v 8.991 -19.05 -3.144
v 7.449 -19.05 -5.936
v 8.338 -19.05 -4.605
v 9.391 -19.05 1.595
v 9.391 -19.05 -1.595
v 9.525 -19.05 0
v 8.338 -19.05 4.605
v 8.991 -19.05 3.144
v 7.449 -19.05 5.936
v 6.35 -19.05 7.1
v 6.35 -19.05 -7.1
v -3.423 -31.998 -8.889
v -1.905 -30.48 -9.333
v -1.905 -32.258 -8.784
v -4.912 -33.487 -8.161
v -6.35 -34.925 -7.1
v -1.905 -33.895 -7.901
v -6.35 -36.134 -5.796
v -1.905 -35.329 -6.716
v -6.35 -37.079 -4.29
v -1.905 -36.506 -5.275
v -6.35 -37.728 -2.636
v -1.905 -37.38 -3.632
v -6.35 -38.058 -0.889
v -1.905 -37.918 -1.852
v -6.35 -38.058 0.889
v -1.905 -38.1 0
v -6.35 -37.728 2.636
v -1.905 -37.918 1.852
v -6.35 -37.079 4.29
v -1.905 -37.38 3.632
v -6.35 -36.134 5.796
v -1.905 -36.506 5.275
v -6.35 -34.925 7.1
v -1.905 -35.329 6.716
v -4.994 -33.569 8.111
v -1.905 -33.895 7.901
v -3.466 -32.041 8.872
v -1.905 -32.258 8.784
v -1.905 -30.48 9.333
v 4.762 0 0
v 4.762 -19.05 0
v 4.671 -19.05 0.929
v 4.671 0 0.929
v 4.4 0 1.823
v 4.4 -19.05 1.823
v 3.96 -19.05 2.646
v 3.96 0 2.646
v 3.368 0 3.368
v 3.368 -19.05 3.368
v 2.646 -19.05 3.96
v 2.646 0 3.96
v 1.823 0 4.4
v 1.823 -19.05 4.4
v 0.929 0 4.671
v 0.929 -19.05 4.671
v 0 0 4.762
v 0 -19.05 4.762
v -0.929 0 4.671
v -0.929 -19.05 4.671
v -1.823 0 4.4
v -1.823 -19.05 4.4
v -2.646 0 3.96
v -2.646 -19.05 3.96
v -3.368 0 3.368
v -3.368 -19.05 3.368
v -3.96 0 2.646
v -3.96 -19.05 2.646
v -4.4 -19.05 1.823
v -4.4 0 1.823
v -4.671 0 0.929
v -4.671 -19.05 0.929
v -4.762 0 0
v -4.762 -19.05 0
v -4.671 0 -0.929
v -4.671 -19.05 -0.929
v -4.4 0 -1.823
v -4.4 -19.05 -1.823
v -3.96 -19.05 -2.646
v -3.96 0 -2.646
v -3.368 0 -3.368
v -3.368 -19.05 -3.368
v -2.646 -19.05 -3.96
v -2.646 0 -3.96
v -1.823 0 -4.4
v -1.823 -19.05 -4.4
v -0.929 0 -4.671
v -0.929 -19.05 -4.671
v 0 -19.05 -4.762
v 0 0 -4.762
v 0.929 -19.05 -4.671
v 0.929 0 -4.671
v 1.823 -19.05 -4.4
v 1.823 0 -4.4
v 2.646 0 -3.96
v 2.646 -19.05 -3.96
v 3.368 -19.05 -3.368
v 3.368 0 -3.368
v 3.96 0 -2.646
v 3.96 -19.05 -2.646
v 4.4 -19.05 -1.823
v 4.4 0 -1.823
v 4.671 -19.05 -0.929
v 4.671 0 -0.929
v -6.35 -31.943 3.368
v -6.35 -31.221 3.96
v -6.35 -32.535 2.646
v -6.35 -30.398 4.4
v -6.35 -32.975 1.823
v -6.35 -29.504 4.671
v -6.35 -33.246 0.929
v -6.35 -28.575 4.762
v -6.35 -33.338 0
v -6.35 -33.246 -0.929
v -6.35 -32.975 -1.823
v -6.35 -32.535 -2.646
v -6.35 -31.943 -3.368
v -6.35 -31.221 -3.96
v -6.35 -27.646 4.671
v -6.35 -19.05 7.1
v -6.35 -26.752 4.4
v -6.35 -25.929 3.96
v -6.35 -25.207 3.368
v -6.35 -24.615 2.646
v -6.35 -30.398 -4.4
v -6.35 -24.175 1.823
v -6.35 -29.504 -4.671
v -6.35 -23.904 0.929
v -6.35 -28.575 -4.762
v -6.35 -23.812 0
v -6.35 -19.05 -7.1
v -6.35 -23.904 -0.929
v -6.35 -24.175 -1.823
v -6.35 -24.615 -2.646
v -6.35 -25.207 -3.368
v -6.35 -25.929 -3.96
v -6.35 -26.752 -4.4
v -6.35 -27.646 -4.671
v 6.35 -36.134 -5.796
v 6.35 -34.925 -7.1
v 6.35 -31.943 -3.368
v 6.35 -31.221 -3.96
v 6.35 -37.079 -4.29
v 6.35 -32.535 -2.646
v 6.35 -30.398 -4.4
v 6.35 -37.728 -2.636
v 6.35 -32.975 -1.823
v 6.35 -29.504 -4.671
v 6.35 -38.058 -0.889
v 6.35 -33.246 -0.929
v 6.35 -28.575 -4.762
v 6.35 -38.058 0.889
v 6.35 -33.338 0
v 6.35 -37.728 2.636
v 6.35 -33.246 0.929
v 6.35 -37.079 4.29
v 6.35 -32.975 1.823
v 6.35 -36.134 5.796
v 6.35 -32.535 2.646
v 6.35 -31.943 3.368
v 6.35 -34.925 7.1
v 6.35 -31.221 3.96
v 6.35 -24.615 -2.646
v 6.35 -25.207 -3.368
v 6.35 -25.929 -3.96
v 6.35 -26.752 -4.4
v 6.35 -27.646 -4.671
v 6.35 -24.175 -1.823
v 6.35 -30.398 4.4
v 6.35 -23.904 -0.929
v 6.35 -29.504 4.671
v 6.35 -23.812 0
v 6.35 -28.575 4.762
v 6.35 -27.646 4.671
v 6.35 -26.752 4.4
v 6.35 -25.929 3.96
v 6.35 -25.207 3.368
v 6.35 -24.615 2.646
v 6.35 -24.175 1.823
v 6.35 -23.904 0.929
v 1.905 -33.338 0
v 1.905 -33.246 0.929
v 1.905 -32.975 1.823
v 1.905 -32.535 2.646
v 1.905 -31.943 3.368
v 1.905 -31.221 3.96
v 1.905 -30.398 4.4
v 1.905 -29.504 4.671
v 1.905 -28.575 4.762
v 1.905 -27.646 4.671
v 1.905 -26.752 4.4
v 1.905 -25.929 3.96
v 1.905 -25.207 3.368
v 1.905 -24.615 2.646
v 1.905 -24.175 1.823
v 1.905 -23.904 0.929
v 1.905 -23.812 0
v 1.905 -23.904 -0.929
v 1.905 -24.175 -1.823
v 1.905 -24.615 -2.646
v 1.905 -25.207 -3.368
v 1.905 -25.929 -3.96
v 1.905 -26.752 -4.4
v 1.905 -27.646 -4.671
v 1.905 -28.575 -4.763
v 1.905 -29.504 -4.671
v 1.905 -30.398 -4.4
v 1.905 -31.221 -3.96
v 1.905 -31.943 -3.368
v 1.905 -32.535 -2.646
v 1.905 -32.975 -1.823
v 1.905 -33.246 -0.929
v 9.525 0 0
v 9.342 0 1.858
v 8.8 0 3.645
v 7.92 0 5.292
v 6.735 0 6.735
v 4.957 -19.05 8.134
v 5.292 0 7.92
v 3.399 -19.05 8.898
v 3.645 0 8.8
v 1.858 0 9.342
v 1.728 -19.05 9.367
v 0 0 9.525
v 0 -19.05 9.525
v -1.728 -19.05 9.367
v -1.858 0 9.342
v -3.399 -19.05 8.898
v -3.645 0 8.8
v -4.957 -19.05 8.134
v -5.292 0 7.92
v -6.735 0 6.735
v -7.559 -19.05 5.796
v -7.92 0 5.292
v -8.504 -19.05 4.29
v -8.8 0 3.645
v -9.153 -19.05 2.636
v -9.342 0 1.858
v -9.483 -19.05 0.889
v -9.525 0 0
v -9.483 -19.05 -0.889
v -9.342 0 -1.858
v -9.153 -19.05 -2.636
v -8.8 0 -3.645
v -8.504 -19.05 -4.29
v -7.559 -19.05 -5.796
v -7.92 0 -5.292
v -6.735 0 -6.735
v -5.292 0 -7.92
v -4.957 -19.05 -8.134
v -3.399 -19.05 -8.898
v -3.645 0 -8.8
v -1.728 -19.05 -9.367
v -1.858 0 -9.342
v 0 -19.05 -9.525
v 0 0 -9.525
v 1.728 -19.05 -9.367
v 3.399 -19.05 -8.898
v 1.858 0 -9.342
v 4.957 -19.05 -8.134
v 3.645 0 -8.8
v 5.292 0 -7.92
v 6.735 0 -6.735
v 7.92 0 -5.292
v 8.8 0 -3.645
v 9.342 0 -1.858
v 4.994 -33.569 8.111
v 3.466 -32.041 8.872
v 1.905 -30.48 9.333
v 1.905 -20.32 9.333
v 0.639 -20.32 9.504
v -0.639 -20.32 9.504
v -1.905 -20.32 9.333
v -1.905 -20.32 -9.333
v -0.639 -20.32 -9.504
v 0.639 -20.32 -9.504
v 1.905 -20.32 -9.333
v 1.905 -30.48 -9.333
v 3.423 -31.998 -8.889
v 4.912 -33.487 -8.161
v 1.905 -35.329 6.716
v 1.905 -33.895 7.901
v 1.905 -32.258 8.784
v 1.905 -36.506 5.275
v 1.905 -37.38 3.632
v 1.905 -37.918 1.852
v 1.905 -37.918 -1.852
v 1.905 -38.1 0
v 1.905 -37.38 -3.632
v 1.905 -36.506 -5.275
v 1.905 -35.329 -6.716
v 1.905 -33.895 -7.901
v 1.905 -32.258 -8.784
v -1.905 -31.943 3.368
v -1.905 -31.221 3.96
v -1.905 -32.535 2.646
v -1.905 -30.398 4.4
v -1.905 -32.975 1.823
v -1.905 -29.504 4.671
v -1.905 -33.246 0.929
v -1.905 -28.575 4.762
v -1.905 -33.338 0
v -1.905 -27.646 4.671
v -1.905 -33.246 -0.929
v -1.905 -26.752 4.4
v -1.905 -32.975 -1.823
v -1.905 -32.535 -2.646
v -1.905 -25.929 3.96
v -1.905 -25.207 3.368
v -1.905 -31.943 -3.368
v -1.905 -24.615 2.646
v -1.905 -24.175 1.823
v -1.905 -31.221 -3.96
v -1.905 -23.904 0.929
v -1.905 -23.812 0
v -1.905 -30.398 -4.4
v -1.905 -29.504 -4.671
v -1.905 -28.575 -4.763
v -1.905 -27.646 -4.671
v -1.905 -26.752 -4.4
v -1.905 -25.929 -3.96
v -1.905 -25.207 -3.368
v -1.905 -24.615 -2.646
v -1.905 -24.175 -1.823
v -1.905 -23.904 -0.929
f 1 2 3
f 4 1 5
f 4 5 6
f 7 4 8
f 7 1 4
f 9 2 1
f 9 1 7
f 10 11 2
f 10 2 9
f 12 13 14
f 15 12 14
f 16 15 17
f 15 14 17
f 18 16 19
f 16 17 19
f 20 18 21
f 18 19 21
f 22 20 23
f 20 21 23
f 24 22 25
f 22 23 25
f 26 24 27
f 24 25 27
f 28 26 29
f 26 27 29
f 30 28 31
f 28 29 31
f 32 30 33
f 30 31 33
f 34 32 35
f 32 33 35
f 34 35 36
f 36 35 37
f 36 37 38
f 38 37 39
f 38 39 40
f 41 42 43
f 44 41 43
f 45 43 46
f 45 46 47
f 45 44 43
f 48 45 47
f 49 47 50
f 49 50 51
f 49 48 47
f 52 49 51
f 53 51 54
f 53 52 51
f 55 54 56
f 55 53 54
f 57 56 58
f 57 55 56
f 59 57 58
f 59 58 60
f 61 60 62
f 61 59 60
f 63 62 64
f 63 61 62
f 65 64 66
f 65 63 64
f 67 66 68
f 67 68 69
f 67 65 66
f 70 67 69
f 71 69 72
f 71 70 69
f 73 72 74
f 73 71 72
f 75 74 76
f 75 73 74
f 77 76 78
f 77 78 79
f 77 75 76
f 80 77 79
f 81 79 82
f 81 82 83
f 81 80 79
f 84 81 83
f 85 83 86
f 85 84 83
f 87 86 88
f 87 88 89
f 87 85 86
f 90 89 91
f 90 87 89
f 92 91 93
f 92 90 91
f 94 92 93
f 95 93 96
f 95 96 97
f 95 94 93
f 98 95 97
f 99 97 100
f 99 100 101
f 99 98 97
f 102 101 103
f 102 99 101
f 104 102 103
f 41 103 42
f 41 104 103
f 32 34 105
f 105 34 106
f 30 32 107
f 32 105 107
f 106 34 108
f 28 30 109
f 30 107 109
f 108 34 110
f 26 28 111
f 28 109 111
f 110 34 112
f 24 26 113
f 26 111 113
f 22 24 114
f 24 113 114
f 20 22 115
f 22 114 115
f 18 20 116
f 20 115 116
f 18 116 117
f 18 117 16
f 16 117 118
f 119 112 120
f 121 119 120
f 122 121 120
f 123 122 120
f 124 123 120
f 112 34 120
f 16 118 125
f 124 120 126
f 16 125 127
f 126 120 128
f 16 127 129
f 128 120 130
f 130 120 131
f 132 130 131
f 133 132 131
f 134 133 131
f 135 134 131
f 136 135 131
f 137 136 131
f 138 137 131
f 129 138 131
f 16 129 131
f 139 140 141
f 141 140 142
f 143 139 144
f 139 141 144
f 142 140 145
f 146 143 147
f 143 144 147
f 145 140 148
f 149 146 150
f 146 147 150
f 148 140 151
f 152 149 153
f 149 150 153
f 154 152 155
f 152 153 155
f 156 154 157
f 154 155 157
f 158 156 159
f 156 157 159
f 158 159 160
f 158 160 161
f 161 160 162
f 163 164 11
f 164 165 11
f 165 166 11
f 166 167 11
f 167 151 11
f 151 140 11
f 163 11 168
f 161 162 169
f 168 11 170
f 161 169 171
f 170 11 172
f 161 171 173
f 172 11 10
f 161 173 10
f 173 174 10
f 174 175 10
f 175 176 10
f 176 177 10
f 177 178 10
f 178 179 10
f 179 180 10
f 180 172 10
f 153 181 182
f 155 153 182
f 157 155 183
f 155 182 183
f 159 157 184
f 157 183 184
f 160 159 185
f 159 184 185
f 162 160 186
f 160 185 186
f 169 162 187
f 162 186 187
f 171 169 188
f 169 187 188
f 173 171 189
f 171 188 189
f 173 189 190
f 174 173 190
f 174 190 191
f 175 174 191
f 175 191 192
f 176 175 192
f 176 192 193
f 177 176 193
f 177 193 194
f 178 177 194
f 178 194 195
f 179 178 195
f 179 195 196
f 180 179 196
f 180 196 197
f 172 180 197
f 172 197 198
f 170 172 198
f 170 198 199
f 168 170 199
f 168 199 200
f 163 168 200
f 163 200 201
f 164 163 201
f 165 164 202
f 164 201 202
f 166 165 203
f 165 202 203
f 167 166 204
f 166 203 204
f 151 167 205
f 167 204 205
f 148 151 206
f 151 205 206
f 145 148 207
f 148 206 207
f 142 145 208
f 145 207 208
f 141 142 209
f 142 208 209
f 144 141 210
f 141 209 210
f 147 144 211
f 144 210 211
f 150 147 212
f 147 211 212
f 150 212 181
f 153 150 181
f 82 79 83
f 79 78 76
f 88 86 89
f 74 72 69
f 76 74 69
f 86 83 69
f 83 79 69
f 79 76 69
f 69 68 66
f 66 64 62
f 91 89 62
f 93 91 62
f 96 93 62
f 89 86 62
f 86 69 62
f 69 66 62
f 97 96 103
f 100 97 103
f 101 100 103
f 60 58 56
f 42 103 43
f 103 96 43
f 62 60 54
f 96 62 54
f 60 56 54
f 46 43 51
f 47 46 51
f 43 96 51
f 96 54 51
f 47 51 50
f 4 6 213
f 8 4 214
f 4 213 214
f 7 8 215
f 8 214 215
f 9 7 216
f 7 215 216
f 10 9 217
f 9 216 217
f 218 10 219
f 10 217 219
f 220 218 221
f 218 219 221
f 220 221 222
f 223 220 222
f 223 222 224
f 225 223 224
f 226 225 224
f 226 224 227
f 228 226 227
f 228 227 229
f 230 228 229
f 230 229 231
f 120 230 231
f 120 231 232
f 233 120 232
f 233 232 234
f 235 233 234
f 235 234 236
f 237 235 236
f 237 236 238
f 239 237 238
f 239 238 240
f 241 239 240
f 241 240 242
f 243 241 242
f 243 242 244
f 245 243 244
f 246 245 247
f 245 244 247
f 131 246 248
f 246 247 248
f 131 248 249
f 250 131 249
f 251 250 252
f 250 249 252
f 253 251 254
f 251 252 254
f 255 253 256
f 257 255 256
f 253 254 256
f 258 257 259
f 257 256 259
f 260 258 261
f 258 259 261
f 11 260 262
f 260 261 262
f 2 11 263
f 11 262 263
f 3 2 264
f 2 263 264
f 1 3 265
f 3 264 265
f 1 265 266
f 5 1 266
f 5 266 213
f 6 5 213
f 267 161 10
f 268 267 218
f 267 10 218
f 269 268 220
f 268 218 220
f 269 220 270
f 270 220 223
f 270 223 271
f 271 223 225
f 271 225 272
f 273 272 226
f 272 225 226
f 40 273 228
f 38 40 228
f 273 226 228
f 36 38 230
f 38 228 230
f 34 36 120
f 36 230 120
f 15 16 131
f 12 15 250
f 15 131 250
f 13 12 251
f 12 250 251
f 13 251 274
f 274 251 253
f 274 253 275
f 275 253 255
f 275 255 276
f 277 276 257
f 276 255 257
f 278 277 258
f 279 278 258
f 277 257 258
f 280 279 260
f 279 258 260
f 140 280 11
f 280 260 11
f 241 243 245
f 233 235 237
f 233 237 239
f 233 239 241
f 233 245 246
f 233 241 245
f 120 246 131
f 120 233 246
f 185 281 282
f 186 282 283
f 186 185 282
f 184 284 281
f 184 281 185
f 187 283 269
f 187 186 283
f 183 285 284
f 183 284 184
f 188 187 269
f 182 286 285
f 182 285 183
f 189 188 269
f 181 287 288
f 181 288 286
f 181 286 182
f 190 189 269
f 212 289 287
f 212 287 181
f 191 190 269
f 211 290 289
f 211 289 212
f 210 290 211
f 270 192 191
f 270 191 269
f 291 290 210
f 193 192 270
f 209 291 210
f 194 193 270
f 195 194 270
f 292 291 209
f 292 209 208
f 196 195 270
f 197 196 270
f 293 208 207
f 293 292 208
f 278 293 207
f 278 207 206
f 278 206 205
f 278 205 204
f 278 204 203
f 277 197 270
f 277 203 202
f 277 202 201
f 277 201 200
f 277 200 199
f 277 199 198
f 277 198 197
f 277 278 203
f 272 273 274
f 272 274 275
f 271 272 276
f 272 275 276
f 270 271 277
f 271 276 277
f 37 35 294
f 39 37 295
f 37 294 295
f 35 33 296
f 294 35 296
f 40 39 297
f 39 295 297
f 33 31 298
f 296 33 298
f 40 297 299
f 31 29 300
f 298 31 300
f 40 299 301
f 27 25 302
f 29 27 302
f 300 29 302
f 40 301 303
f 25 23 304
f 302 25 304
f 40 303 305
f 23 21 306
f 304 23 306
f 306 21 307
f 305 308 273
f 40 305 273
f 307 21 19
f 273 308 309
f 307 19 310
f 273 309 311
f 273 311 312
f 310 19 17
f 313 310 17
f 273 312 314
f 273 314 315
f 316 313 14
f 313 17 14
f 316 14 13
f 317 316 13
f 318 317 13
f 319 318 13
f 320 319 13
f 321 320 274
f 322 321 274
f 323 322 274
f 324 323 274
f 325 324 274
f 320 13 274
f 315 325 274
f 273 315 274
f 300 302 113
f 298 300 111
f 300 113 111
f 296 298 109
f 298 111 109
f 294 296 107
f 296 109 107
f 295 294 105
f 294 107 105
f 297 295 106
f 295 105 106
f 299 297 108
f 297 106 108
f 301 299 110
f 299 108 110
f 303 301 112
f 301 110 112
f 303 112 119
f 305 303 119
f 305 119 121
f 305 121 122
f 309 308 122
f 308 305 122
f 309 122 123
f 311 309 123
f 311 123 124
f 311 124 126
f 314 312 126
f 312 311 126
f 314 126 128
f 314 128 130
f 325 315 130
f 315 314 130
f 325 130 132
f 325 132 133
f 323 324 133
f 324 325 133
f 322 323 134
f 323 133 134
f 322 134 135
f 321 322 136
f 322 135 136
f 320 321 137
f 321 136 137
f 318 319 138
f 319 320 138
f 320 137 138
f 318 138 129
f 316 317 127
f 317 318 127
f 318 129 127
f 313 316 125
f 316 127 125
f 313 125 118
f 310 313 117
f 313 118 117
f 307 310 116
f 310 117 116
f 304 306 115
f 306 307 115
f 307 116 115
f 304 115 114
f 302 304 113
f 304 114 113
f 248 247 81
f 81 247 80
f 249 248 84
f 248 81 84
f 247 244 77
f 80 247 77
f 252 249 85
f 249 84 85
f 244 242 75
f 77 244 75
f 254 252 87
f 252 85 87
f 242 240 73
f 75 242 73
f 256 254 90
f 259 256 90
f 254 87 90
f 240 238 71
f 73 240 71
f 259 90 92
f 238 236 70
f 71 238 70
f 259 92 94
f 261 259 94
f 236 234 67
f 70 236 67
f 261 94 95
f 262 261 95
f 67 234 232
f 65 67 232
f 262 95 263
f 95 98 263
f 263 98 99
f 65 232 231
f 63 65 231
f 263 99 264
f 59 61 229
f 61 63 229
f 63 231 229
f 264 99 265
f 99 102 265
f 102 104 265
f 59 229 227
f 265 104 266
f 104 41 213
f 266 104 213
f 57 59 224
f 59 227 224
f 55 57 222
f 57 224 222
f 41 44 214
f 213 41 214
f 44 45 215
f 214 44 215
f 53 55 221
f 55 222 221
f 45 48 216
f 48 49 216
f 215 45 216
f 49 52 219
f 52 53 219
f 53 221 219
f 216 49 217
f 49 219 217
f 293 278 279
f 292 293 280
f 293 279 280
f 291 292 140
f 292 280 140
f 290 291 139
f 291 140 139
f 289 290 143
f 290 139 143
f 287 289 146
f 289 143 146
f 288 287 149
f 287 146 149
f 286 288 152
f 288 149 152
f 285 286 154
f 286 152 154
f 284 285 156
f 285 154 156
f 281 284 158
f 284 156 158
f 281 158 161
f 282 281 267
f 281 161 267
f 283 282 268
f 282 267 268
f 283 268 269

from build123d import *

# Parameters (mm, degrees)
F0_R      = 9.525
F0_R_2    = 4.7625
F1_DEPTH  = 19.05
F3_DEPTH  = 19.05
F4_R      = 4.7625
F5_DEPTH  = 15.876
F7_DEPTH  = 15.876
F8_W      = 3.81
F8_H      = 20.32
F9_DEPTH  = 9.526
F10_DEPTH = 9.526


with BuildPart() as f1:
    # F0 (on Front) → F1 (new body)
    with BuildSketch(Plane.XZ):
        Circle(F0_R)
        Circle(F0_R_2, mode=Mode.SUBTRACT)
    extrude(amount=F1_DEPTH)

    # F2 (on face) → F3 (join)
    with BuildSketch(Plane.XZ.offset(19.05)):
        with BuildLine():
            Line((-6.35, 7.099516), (-6.35, -7.099516))
            ThreePointArc((-6.35, -7.099516), (0, -9.525), (6.35, -7.099516))
            Line((6.35, -7.099516), (6.35, 7.099516))
            ThreePointArc((6.35, 7.099516), (0, 9.525), (-6.35, 7.099516))
        make_face()
    extrude(amount=F3_DEPTH)

    # F4 (on face) → F5 (cut, through all)
    with BuildSketch(Plane(origin=(-6.35, 0, 0), x_dir=(0, -1, 0), z_dir=(-1, 0, 0))):
        with Locations((28.575, 0)):
            Circle(F4_R)
    extrude(amount=-F5_DEPTH, mode=Mode.SUBTRACT)

    # F6 (on face) → F7 (cut, through all)
    with BuildSketch(Plane.YZ.offset(6.35)):
        with BuildLine():
            ThreePointArc((-28.854043, -9.520912), (-38.1, 0), (-28.854043, 9.520912))
            Line((-28.854043, 9.520912), (-28.854043, 11.027435))
            Line((-28.854043, 11.027435), (-38.735, 11.027435))
            Line((-38.735, 11.027435), (-38.735, 9.520912))
            Line((-38.735, 9.520912), (-38.735, -9.520912))
            Line((-38.735, -9.520912), (-38.735, -10.820097))
            Line((-38.735, -10.820097), (-28.854043, -10.820097))
            Line((-28.854043, -10.820097), (-28.854043, -9.520912))
        make_face()
    extrude(amount=-F7_DEPTH, mode=Mode.SUBTRACT)

    # F8 (on Top) → F9 (cut, through all)
    with BuildSketch(Plane.XY):
        with Locations((0, -30.48)):
            Rectangle(F8_W, F8_H)
    extrude(amount=-F9_DEPTH, mode=Mode.SUBTRACT)

    # F8 (on Top) → F10 (cut, through all)
    with BuildSketch(Plane.XY):
        with Locations((0, -30.48)):
            Rectangle(F8_W, F8_H)
    extrude(amount=F10_DEPTH, mode=Mode.SUBTRACT)


solid = f1.part
